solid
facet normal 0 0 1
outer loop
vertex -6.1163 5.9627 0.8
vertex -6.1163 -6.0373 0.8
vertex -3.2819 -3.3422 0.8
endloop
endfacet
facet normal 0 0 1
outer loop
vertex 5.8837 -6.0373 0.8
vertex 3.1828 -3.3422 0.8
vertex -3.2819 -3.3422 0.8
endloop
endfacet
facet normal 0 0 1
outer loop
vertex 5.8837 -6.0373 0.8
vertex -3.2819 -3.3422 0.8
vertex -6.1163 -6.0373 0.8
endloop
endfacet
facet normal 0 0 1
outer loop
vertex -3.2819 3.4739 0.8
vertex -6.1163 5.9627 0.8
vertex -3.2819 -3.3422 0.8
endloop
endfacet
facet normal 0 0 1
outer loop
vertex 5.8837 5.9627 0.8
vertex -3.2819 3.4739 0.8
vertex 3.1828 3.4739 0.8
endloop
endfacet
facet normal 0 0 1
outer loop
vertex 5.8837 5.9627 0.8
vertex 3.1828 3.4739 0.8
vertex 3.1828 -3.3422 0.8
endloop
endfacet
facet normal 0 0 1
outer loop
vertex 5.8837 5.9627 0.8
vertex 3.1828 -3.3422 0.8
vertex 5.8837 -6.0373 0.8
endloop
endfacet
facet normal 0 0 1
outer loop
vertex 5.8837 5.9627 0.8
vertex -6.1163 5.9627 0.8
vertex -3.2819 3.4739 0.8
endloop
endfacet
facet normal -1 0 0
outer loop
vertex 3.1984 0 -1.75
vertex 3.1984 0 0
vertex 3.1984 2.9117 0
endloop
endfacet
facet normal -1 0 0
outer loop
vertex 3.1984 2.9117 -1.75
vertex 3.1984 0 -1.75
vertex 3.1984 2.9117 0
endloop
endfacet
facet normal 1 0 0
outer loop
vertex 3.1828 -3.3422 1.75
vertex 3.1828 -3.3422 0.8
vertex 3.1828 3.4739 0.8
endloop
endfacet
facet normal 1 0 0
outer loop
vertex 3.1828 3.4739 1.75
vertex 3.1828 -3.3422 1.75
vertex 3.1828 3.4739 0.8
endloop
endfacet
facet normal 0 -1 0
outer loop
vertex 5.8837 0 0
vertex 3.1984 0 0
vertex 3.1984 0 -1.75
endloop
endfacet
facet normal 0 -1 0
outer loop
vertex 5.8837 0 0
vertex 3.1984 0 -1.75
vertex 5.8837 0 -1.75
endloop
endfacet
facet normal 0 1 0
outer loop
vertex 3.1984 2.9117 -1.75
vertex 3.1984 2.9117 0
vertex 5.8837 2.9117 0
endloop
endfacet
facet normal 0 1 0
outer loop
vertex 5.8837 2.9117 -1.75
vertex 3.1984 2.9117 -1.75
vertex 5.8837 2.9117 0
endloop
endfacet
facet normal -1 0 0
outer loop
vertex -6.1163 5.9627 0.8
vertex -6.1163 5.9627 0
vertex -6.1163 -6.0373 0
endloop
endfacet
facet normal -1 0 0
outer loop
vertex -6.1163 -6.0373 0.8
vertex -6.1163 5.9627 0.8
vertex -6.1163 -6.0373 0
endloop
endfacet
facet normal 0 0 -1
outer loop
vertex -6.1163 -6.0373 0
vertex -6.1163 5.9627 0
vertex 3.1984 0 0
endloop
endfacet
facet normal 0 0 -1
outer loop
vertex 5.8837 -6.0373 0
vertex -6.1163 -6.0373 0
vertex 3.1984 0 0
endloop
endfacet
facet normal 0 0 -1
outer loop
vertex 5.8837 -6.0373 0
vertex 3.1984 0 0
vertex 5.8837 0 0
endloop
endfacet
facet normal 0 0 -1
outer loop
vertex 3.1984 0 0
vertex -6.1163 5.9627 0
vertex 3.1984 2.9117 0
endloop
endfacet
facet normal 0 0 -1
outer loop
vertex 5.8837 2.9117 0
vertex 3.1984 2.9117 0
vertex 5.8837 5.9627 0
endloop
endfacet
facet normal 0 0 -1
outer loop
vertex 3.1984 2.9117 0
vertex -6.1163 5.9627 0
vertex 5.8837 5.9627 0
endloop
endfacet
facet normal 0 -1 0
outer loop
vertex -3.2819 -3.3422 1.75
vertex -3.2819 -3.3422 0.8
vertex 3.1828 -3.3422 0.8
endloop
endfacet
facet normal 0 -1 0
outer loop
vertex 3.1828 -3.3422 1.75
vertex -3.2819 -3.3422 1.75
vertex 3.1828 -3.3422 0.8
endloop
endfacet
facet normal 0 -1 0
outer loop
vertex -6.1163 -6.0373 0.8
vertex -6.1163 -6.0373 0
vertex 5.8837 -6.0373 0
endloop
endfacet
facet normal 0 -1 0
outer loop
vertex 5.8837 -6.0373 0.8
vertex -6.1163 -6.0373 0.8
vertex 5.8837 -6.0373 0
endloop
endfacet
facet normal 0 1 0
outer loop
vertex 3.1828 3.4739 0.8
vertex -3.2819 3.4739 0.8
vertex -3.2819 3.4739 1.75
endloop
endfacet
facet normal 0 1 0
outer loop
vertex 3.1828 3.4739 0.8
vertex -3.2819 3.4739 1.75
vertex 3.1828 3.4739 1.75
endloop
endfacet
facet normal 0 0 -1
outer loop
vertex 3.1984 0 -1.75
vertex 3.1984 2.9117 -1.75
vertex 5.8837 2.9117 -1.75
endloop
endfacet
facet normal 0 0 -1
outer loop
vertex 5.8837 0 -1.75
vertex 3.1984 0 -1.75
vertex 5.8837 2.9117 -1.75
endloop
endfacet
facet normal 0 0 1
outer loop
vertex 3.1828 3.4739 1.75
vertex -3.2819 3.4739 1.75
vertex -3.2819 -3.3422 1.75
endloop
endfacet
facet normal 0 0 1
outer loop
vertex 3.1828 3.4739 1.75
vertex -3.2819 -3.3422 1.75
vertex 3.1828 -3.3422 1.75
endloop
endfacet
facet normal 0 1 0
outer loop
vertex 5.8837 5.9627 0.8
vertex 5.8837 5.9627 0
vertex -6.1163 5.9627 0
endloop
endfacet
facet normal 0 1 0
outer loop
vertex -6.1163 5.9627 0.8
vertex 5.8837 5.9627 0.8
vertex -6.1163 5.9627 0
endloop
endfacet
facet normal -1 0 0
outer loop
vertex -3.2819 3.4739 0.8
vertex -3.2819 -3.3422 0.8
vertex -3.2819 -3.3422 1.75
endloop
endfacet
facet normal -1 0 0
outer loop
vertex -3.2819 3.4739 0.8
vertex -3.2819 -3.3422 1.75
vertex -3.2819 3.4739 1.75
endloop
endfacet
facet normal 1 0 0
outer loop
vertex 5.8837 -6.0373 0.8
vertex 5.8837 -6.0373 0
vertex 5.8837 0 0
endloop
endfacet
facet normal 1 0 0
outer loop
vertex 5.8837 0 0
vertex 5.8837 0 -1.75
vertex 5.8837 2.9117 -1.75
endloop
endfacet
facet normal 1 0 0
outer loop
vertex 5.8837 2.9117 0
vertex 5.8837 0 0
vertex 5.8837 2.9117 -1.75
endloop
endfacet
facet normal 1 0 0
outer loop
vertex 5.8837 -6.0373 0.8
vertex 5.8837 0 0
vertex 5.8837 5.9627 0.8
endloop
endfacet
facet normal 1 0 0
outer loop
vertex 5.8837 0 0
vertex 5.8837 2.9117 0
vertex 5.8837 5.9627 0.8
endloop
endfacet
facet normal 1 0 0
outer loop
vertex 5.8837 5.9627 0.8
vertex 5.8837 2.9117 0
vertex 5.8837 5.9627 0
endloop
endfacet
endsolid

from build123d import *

# Parameters (mm, degrees)
F0_W     = 6.464736
F0_H     = 6.81608
F0_W_2   = 2.685256
F0_H_2   = 2.91172
F1_DEPTH = 0.8
F2_DEPTH = 1.75
F3_DEPTH = 1.75


with BuildPart() as f1:
    # F0 (on Top) → F1 (new body)
    with BuildSketch(Plane.XY):
        Polygon((5.88367, 5.962724), (-6.11633, 5.962724), (-6.11633, -6.037276), (5.88367, -6.037276), (5.88367, 0), (3.198414, 0), (3.198414, 2.91172), (5.88367, 2.91172), align=None)
        with Locations((-0.049542, 0.065831)):
            Rectangle(F0_W, F0_H, mode=Mode.SUBTRACT)
        with Locations((4.541042, 1.45586)):
            Rectangle(F0_W_2, F0_H_2)
        with Locations((-0.049542, 0.065831)):
            Rectangle(F0_W, F0_H)
    extrude(amount=F1_DEPTH)

    # F0 (on Top) → F2 (join)
    with BuildSketch(Plane.XY):
        with Locations((-0.049542, 0.065831)):
            Rectangle(F0_W, F0_H)
    extrude(amount=F2_DEPTH)

    # F0 (on Top) → F3 (join)
    with BuildSketch(Plane.XY):
        with Locations((4.541042, 1.45586)):
            Rectangle(F0_W_2, F0_H_2)
    extrude(amount=-F3_DEPTH)


solid = f1.part
